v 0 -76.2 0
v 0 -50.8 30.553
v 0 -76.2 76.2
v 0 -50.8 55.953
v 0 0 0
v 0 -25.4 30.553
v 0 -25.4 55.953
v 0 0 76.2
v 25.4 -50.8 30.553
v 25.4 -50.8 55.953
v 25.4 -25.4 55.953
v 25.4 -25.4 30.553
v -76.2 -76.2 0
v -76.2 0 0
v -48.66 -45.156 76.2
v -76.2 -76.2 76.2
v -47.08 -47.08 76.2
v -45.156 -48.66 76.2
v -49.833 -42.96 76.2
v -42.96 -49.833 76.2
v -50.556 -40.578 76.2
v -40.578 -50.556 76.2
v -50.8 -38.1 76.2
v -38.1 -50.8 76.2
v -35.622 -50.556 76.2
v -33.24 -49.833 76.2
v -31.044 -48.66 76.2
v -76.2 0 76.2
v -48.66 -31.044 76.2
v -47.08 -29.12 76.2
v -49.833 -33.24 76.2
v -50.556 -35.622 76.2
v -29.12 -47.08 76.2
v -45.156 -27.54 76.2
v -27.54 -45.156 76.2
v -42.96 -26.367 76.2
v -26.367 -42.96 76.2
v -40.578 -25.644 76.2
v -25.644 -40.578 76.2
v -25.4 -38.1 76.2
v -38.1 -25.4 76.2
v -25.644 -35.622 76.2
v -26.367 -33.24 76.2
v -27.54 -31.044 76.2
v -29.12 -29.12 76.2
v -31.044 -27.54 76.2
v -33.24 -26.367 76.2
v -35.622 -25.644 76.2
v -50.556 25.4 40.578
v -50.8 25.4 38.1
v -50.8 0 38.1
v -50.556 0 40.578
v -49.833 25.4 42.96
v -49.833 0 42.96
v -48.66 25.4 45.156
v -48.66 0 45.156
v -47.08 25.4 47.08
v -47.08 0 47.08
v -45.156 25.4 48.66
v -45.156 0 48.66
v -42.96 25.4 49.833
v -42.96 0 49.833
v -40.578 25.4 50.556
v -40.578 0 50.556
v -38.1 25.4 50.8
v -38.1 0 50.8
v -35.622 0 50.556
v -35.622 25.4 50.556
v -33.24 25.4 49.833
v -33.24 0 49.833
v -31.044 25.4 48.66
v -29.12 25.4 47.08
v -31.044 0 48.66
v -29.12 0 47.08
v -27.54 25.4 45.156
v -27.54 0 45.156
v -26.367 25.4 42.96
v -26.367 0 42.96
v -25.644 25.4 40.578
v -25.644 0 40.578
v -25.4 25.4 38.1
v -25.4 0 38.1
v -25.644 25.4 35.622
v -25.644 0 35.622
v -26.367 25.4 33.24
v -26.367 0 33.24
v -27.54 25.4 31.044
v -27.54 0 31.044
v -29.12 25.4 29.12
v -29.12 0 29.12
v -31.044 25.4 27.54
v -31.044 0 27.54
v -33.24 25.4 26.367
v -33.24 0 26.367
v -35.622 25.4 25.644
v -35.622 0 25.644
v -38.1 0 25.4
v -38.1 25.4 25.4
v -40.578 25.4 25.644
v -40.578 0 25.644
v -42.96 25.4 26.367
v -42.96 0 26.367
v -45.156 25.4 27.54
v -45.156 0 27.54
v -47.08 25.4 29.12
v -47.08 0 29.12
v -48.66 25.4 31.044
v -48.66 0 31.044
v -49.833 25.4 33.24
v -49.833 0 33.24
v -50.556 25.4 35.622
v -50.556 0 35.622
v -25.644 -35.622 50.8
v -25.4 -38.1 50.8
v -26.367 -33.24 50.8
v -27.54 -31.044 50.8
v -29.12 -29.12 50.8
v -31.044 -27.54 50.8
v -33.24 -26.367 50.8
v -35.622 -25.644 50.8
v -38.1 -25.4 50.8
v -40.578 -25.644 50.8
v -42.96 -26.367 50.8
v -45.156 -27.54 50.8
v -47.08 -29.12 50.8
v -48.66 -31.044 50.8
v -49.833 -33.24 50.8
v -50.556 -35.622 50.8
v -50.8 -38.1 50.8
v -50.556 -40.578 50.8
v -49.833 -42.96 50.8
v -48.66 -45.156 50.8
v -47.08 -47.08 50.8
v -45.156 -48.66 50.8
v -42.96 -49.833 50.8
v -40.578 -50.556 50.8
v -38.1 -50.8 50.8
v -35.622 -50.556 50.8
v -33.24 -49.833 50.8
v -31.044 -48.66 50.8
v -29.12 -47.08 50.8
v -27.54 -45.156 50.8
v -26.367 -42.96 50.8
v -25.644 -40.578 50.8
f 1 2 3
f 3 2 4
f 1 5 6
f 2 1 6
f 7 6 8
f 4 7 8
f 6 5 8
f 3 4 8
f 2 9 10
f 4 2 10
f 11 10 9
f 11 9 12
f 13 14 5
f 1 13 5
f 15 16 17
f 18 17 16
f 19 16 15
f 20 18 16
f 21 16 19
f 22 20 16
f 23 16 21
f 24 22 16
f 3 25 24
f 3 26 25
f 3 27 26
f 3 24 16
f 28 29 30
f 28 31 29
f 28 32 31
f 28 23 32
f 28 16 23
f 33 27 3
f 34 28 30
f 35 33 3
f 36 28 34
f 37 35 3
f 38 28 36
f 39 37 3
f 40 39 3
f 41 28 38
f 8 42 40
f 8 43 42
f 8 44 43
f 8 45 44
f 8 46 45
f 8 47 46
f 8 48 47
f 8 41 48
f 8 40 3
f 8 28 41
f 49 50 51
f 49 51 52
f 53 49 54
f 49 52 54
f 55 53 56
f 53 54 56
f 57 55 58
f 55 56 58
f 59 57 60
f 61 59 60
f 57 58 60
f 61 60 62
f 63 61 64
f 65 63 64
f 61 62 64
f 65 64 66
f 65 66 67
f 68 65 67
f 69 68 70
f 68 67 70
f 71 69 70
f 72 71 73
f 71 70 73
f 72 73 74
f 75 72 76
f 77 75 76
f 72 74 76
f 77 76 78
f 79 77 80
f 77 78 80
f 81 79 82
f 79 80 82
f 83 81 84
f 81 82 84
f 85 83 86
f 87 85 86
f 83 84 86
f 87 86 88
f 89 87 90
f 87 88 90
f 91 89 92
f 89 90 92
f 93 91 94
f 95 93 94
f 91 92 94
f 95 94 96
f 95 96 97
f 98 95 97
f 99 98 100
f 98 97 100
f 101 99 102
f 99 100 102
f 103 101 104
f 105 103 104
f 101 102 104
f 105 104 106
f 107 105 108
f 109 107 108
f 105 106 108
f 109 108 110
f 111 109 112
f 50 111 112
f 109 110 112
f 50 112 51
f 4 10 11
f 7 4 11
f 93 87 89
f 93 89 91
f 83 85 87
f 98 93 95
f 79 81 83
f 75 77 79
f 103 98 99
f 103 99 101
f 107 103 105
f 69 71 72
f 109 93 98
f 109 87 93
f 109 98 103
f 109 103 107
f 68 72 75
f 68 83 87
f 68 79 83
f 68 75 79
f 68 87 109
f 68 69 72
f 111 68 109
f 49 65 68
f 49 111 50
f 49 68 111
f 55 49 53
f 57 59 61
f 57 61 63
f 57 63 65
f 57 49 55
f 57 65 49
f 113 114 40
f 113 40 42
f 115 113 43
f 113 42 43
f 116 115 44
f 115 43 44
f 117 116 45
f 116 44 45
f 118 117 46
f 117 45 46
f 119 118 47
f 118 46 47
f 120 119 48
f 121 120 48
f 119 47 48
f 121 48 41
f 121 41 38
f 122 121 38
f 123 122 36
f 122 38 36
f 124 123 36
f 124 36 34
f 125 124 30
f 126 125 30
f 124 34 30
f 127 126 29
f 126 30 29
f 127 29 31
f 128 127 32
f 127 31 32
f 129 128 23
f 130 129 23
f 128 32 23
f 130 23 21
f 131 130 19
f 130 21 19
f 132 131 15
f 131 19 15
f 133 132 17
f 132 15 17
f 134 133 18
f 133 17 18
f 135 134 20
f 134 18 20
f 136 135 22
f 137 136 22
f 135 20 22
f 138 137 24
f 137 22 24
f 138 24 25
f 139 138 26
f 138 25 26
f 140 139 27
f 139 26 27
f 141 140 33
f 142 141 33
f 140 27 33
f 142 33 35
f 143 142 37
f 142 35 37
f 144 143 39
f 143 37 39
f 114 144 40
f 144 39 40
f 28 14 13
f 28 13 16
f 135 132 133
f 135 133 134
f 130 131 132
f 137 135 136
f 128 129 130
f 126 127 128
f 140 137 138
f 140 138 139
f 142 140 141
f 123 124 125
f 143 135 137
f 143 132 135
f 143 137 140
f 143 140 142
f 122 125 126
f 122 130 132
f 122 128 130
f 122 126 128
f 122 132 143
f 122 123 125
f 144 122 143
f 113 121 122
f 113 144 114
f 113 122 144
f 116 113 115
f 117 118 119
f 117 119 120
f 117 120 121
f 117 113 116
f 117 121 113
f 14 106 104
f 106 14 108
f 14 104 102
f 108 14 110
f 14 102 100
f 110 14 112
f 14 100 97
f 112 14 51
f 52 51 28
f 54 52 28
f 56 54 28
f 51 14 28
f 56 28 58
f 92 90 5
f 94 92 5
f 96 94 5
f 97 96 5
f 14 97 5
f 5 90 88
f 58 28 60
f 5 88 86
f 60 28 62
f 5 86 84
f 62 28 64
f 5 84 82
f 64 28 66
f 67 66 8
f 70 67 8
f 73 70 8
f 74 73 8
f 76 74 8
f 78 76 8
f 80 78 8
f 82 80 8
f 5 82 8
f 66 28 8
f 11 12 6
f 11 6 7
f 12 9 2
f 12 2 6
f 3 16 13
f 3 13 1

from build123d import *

# Parameters (mm, degrees)
F0_W     = 76.2
F0_H     = 76.2
F1_DEPTH = 76.2
F2_R     = 12.7
F3_DEPTH = 25.4
F4_W     = 25.4
F4_H     = 25.4
F5_DEPTH = 25.4
F6_R     = 12.7
F7_DEPTH = 25.4


with BuildPart() as f1:
    # F0 (on Front) → F1 (new body)
    with BuildSketch(Plane.XZ):
        with Locations((-38.1, 38.1)):
            Rectangle(F0_W, F0_H)
    extrude(amount=F1_DEPTH)

    # F2 (on face) → F3 (cut)
    with BuildSketch(Plane.XY.offset(76.2)):
        with Locations((-38.1, -38.1)):
            Circle(F2_R)
    extrude(amount=-F3_DEPTH, mode=Mode.SUBTRACT)

    # F4 (on face) → F5 (join)
    with BuildSketch(Plane.YZ):
        with Locations((-38.1, 43.252745)):
            Rectangle(F4_W, F4_H)
    extrude(amount=F5_DEPTH)

    # F6 (on face) → F7 (join)
    with BuildSketch(Plane(origin=(0, 0, 0), x_dir=(-1, 0, 0), z_dir=(0, 1, 0))):
        with Locations((38.1, 38.1)):
            Circle(F6_R)
    extrude(amount=F7_DEPTH)


solid = f1.part
